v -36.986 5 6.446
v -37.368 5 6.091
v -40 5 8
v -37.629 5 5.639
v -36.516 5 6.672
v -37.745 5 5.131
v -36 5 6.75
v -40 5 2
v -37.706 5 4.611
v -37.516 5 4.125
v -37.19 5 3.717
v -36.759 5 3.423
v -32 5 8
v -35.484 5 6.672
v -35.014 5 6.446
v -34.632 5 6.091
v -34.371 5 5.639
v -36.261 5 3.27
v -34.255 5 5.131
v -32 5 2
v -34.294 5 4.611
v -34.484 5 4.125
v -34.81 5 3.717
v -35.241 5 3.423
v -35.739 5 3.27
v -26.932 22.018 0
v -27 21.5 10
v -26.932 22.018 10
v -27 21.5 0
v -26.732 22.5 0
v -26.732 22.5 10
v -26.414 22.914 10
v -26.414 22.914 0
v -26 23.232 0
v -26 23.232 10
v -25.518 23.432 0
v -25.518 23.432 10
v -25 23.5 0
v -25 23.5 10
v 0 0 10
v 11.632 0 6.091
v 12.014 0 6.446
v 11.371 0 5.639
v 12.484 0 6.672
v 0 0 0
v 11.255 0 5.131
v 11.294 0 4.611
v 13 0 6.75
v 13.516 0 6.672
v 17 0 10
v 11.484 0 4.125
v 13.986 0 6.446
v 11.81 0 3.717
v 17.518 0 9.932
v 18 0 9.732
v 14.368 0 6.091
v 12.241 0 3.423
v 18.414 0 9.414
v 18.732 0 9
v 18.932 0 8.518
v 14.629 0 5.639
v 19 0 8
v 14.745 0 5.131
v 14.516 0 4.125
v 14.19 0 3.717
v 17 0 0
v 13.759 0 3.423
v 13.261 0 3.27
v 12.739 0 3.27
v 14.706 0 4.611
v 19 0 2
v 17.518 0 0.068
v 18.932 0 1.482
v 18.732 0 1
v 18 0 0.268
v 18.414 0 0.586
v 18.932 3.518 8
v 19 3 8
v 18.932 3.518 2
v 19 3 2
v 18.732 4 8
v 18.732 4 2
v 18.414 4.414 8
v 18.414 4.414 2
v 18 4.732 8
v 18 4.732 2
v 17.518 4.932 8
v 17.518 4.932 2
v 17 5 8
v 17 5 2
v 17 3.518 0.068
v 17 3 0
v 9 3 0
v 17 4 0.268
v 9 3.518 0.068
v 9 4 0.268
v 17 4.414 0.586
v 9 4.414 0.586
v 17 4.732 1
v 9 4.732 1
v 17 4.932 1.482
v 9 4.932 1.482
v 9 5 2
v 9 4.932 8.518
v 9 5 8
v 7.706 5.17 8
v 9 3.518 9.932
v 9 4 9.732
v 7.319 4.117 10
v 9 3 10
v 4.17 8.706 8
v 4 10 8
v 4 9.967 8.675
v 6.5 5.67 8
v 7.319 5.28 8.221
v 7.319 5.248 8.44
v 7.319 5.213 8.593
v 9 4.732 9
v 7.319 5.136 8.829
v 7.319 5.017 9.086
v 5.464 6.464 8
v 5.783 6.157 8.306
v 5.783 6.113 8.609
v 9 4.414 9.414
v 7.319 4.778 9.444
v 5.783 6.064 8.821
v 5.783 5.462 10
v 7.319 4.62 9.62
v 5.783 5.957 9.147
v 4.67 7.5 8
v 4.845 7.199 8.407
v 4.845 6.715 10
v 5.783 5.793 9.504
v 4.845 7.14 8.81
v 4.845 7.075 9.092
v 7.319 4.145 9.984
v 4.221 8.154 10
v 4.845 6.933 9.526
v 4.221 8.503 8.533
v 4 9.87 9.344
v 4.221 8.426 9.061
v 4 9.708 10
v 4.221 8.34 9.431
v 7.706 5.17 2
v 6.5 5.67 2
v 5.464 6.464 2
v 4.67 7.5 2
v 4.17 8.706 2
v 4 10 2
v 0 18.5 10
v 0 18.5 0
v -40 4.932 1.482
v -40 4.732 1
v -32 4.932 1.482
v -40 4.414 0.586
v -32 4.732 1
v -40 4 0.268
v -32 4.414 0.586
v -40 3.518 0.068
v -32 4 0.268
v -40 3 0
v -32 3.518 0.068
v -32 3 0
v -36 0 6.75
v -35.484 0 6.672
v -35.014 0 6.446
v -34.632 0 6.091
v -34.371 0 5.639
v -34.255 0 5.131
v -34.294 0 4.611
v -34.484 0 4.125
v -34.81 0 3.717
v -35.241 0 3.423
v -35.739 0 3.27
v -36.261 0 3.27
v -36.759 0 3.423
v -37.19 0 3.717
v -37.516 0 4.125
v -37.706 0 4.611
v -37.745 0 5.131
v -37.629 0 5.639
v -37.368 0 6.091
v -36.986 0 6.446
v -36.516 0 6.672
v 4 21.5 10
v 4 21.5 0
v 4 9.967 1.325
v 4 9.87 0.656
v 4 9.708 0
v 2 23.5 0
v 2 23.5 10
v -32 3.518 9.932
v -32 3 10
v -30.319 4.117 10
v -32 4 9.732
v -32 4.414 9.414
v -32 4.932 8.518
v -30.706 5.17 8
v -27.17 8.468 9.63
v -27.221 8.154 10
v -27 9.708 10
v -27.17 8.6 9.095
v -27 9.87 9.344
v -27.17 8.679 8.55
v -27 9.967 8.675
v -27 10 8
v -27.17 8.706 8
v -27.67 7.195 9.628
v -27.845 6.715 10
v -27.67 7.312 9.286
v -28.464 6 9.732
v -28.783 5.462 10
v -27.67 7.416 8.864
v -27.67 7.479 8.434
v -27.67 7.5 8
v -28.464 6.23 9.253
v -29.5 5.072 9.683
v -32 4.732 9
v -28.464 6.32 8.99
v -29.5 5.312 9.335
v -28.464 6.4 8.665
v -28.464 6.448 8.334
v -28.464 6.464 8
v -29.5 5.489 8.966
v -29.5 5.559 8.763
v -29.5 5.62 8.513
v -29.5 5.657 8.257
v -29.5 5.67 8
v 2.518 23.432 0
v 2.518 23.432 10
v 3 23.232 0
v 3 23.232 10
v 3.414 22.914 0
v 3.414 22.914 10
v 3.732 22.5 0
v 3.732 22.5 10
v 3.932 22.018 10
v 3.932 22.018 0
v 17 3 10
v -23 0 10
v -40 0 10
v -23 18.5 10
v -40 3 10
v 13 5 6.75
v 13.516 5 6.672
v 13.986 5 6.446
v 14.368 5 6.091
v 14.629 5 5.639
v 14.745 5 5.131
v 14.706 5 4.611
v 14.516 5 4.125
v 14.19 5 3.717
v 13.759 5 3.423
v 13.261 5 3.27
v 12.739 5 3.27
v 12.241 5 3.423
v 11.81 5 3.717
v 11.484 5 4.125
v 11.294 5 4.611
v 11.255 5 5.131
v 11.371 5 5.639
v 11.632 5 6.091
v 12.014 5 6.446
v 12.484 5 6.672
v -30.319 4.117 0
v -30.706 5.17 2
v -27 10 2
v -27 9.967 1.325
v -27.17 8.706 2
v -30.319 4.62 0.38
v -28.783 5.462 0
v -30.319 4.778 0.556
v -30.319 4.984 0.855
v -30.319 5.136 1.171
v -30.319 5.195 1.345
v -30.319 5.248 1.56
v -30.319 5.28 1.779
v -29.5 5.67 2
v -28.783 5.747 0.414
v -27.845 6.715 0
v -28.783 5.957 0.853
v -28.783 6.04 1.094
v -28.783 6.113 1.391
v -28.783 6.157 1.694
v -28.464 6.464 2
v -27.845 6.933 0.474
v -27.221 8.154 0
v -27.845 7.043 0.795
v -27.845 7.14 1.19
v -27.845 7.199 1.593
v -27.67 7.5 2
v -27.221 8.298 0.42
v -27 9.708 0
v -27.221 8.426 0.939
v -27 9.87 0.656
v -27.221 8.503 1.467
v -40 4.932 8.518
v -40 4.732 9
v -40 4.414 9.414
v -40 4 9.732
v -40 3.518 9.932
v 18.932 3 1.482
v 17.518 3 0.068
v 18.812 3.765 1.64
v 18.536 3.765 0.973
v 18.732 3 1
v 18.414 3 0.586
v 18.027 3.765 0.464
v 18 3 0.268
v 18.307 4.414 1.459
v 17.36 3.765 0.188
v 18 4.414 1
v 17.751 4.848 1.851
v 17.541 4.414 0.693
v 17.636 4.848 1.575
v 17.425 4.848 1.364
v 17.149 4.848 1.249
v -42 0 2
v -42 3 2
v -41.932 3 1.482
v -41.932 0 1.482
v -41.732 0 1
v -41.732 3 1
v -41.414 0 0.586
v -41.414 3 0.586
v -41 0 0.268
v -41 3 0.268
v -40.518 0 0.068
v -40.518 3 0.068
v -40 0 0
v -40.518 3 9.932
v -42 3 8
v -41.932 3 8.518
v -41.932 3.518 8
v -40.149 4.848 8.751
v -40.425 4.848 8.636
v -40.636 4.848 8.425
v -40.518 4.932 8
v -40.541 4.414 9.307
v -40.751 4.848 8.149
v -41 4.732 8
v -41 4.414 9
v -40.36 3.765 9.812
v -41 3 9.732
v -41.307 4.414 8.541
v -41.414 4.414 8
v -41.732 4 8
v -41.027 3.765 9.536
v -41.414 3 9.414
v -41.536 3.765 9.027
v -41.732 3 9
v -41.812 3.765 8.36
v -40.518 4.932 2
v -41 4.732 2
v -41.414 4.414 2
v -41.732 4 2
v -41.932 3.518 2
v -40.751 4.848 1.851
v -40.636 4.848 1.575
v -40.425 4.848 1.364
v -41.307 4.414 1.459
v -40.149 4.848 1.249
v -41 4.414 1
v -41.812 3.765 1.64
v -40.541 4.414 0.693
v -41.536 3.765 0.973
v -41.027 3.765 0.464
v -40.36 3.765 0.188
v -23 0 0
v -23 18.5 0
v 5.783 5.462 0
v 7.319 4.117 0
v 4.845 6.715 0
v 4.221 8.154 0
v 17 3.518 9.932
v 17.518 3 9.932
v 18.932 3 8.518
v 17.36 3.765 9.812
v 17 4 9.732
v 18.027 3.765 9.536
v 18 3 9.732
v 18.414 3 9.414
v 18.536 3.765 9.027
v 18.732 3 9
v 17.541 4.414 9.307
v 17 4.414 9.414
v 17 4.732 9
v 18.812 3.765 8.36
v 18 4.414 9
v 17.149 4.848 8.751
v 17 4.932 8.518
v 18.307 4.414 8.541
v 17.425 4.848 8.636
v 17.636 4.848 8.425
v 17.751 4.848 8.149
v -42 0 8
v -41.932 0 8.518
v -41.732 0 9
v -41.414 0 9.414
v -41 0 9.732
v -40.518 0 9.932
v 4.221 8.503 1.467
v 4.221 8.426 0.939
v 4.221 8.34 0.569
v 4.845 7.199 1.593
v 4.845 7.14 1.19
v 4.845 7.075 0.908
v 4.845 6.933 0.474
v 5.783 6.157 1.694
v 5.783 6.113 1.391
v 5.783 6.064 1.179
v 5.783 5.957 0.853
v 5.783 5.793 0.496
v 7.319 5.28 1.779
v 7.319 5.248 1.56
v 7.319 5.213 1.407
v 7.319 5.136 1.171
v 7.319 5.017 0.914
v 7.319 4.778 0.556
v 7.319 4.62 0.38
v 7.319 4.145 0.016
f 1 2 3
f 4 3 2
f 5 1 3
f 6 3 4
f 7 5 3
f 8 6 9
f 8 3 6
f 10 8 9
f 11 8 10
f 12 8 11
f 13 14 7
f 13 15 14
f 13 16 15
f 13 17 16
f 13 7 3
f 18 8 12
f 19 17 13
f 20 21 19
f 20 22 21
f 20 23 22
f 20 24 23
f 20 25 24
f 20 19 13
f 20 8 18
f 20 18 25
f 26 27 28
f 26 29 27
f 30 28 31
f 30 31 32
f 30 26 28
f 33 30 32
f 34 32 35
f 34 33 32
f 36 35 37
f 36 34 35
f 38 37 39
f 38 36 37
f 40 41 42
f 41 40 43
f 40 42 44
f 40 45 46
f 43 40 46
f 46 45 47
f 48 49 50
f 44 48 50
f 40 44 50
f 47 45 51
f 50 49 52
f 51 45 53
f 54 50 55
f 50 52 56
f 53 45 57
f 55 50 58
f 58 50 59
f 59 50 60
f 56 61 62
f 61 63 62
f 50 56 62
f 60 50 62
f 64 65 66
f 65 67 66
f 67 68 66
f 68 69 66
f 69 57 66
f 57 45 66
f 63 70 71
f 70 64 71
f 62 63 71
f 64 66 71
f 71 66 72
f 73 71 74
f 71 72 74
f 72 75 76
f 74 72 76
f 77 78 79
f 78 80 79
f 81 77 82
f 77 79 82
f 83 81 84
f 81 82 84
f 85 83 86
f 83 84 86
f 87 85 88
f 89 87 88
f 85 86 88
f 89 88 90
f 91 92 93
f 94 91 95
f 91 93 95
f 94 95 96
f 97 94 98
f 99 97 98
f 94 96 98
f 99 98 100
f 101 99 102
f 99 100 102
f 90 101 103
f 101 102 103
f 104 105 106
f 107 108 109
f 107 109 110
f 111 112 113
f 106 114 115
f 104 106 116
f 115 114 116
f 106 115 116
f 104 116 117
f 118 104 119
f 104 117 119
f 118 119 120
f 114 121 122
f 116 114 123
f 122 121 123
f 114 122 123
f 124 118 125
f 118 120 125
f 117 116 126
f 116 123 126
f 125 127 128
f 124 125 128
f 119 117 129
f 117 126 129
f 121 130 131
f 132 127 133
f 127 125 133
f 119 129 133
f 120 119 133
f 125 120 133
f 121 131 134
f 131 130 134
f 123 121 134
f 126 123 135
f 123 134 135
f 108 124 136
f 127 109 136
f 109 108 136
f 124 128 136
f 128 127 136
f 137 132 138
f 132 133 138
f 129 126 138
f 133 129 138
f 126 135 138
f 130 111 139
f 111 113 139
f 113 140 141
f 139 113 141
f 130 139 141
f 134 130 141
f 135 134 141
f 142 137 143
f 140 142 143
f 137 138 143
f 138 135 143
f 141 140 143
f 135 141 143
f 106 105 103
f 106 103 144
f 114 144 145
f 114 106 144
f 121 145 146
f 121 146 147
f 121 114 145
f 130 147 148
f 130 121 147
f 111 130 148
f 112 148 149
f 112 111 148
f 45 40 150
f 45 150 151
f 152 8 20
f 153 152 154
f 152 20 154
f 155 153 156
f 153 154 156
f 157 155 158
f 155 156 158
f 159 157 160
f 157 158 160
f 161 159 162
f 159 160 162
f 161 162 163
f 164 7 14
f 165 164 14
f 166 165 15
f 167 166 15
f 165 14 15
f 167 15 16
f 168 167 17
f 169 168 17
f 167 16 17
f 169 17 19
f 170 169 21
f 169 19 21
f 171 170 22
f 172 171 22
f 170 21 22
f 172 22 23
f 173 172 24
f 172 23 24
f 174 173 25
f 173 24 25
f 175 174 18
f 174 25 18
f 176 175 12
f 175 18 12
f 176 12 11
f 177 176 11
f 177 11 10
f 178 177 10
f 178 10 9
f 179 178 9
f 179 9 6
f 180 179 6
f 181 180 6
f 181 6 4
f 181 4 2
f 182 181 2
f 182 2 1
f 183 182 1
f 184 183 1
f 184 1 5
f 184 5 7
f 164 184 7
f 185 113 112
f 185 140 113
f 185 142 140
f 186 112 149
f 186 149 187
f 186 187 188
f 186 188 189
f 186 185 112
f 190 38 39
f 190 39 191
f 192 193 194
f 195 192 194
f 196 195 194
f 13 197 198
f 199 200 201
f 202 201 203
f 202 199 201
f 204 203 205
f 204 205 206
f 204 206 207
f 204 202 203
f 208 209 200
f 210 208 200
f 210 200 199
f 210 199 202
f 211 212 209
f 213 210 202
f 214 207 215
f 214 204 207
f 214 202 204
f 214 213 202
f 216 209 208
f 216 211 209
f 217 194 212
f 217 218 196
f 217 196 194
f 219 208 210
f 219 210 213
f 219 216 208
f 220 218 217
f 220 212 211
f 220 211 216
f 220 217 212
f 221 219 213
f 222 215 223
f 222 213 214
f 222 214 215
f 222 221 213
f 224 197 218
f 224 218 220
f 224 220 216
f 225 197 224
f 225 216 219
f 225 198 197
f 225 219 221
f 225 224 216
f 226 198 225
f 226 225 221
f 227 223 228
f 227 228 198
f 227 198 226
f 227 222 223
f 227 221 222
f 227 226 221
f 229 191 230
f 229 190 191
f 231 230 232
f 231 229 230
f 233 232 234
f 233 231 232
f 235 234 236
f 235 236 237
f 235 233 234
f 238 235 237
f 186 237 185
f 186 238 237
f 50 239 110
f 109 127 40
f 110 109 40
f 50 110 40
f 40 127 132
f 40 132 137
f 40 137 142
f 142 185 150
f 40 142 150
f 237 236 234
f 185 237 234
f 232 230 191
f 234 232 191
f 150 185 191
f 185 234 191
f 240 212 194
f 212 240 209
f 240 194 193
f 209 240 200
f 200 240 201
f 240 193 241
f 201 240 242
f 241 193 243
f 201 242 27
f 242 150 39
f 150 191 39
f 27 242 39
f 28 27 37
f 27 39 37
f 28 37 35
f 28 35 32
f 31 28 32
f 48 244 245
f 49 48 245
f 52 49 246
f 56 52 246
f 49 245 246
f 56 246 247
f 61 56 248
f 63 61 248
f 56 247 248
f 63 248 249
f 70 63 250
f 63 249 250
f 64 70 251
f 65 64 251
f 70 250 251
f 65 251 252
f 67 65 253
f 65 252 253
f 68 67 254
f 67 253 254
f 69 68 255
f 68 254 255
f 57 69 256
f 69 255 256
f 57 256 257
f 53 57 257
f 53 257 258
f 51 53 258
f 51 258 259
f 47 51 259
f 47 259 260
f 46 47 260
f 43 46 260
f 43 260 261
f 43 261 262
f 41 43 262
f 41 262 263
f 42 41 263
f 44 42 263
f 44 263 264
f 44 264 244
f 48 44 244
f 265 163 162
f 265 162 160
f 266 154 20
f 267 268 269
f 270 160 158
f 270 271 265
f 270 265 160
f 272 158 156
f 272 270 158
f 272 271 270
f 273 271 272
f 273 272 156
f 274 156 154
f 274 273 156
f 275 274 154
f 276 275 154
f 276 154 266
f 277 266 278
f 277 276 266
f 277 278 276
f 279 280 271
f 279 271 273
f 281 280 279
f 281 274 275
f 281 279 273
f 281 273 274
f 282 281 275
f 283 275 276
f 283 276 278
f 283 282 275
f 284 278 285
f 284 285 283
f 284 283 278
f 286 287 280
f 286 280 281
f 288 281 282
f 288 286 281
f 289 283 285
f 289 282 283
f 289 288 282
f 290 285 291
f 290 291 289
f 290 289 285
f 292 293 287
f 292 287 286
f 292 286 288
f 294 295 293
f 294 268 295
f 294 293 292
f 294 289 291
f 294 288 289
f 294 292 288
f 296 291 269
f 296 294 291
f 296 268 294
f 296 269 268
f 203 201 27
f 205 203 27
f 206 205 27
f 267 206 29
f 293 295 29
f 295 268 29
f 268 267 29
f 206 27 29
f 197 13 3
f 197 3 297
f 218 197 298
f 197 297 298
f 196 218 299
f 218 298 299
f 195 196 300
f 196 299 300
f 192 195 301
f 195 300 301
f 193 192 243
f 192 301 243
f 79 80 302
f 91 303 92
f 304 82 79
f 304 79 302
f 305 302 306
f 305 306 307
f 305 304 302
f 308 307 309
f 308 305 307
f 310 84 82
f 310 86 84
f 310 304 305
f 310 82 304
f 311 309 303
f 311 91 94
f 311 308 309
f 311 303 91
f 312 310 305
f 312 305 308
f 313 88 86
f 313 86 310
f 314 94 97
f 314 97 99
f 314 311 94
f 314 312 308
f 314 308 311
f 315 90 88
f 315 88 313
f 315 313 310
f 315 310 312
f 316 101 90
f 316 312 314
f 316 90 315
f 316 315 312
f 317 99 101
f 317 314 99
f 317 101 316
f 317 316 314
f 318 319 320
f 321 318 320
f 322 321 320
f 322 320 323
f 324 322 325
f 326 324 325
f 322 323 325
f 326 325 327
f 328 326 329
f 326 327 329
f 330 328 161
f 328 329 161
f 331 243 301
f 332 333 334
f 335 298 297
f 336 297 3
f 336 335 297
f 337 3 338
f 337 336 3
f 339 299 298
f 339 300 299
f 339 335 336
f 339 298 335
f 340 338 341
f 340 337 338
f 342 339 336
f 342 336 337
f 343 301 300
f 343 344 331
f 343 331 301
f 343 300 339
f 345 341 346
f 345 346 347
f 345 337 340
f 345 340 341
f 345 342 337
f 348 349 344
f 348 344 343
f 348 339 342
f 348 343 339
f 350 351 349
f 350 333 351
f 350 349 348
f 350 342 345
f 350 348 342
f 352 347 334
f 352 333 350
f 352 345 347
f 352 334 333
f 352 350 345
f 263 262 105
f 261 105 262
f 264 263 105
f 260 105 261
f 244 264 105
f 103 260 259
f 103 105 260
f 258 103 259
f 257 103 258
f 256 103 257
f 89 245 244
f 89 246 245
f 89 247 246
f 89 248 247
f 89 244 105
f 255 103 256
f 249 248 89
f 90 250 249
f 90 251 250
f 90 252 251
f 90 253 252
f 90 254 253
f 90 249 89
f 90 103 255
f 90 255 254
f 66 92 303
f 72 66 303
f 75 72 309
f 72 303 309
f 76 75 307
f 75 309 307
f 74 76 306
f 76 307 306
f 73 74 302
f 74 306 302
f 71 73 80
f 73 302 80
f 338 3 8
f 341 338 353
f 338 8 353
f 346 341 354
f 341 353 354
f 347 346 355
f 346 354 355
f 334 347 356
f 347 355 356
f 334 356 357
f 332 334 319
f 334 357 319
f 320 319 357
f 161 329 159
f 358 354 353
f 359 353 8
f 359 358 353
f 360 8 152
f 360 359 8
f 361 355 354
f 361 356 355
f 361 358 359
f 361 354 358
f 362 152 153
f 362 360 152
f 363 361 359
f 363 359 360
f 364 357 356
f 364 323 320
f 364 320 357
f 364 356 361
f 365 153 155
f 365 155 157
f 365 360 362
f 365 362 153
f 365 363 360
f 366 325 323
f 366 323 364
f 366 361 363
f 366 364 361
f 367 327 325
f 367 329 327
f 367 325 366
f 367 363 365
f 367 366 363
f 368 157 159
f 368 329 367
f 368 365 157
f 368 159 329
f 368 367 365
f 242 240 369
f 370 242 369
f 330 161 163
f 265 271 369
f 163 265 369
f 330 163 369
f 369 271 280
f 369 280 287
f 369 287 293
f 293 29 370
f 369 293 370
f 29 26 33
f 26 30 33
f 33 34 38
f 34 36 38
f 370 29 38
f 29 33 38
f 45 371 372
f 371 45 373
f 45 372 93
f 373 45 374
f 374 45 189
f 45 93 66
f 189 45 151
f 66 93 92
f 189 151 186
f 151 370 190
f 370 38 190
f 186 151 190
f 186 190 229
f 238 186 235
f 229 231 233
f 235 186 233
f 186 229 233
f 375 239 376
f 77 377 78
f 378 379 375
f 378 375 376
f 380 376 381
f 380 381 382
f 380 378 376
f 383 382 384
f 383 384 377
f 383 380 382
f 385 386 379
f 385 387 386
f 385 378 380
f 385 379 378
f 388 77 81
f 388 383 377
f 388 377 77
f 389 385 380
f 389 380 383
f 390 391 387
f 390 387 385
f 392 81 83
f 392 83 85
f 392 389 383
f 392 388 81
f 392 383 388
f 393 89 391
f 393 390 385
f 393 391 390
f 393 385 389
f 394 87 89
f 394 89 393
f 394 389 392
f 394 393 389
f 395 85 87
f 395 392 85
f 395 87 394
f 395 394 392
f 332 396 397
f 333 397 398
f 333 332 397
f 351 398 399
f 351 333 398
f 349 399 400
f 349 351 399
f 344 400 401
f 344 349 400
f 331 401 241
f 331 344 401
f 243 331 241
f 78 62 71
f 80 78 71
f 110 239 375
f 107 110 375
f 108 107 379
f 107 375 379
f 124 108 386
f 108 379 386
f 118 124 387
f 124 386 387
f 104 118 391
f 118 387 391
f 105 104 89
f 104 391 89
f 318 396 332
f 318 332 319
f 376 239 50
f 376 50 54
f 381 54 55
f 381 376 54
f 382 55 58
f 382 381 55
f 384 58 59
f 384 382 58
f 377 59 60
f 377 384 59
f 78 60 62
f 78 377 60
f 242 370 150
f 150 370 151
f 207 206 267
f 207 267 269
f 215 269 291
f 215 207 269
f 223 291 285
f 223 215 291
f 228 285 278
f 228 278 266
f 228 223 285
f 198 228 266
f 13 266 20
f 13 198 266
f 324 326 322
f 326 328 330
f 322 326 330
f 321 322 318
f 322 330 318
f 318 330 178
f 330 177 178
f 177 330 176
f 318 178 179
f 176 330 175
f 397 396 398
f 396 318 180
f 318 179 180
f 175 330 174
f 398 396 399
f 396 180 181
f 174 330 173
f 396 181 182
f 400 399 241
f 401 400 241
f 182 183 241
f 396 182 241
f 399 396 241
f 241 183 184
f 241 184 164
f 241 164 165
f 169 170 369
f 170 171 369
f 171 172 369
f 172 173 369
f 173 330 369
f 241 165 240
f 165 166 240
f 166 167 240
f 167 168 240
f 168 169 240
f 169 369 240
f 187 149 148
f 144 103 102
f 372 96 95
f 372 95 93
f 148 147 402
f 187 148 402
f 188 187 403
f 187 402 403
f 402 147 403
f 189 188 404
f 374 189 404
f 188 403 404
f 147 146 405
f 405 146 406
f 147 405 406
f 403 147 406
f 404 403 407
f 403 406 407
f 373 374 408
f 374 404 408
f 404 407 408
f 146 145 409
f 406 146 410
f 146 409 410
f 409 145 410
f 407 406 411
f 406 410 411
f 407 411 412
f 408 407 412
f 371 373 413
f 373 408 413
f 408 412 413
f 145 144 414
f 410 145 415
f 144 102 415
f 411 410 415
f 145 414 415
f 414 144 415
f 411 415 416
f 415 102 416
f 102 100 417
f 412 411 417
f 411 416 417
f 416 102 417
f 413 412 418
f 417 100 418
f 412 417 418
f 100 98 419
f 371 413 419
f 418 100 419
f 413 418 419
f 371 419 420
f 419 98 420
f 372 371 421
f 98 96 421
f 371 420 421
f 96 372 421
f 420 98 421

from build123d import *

# Parameters (mm, degrees)
SKETCH1_W           = 15
SKETCH1_H           = 10
SKETCH1_W_2         = 4
SKETCH1_W_3         = 23
BOSS_EXTRUDE1_DEPTH = 23.5
SKETCH1_3_W         = 23
SKETCH1_3_H         = 10
CUT_EXTRUDE1_DEPTH  = 18.5
CUT_EXTRUDE2_START  = 23.5
SKETCH1_4_W         = 15
SKETCH1_4_H         = 10
CUT_EXTRUDE2_DEPTH  = 18.5
FILLET1_R           = 2
FILLET2_R           = 2
FILLET3_R           = 5
CUT_EXTRUDE3_REACH  = 48.971
SKETCH2_R           = 1.75


with BuildPart() as part:
    # Sketch1 → Boss-Extrude1 (new body)
    with BuildSketch(Plane(origin=(0, 0, 0), x_dir=(1, 0, 0), z_dir=(0, 1, 0))):
        with Locations((-34.5, -5)):
            Rectangle(SKETCH1_W, SKETCH1_H)
        with Locations((-25, -5)):
            Rectangle(SKETCH1_W_2, SKETCH1_H)
        with Locations((-11.5, -5)):
            Rectangle(SKETCH1_W_3, SKETCH1_H)
        with Locations((2, -5)):
            Rectangle(SKETCH1_W_2, SKETCH1_H)
        with Locations((11.5, -5)):
            Rectangle(SKETCH1_W, SKETCH1_H)
    extrude(amount=BOSS_EXTRUDE1_DEPTH)

    # Sketch1<3> → Cut-Extrude1 (cut)
    with BuildSketch(Plane(origin=(0, 0, 0), x_dir=(1, 0, 0), z_dir=(0, 1, 0))):
        with Locations((-11.5, -5)):
            Rectangle(SKETCH1_3_W, SKETCH1_3_H)
    extrude(amount=CUT_EXTRUDE1_DEPTH, mode=Mode.SUBTRACT)

    # Sketch1<4> → Cut-Extrude2 (cut)
    with BuildSketch(Plane(origin=(0, 0, 0), x_dir=(1, 0, 0), z_dir=(0, 1, 0)).offset(CUT_EXTRUDE2_START)):
        with Locations((-34.5, -5)):
            Rectangle(SKETCH1_4_W, SKETCH1_4_H)
        with Locations((11.5, -5)):
            Rectangle(SKETCH1_4_W, SKETCH1_4_H)
    extrude(amount=-CUT_EXTRUDE2_DEPTH, mode=Mode.SUBTRACT)

    # Fillet1
    fillet1_edges = [part.edges().sort_by_distance(p)[0] for p in [
        (19, 2.5, 0),
        (19, 2.5, 10),
        (-42, 2.5, 10),
        (-42, 2.5, 0),
        (-27, 23.5, 5),
        (4, 23.5, 5),
    ]]
    fillet(fillet1_edges, radius=FILLET1_R)

    # Fillet2
    fillet2_edges = [part.edges().sort_by_distance(p)[0] for p in [
        (-33.5, 5, 0),
        (-33.5, 5, 10),
        (10.5, 5, 10),
        (10.5, 5, 0),
        (19, 5, 5),
        (18.414213562, 5, 9.414213562),
        (18.414213562, 5, 0.585786438),
        (-42, 5, 5),
        (-41.414213562, 5, 9.414213562),
        (-41.414213562, 5, 0.585786438),
    ]]
    fillet(fillet2_edges, radius=FILLET2_R)

    # Fillet3
    # the kernel refuses this fillet: 5 mm, written as the material it adds along each edge
    with BuildSketch(Plane(origin=(-27, 5, 8), x_dir=(-1, 0, 0), z_dir=(0, 0, -1))) as fillet3_piece_1:
        with BuildLine():
            CenterArc((FILLET3_R, FILLET3_R), FILLET3_R, 180, 90)
            Line((0, FILLET3_R), (0, 0))
            Line((0, 0), (FILLET3_R, 0))
        make_face()
    extrude(amount=6)
    with BuildSketch(Plane(origin=(4, 5, 8), x_dir=(1, 0, 0), z_dir=(0, 0, -1))) as fillet3_piece_2:
        with BuildLine():
            CenterArc((FILLET3_R, -FILLET3_R), FILLET3_R, 90, 90)
            Line((0, -FILLET3_R), (0, 0))
            Line((0, 0), (FILLET3_R, 0))
        make_face()
    extrude(amount=6)
    with BuildSketch(Plane(origin=(-27, 3, 8), x_dir=(0, 0.9999802608561372, -0.006283143965558846), z_dir=(0, 0.006283143965558846, 0.9999802608561372))) as fillet3_piece_3_section:
        with BuildLine():
            CenterArc((-2 - FILLET3_R, FILLET3_R), FILLET3_R, 270, 90)
            Line((-2 - FILLET3_R, 0), (-2, 0))
            Line((-2, 0), (-2, FILLET3_R))
        make_face()
    fillet3_piece_3 = revolve(axis=Axis((-27, 3, 8), (-1, 0, 0)), revolution_arc=359.64, mode=Mode.PRIVATE)
    fillet3_piece_3 = split(fillet3_piece_3, bisect_by=Plane(origin=(-28.84257052, 4.524977571, 10), z_dir=(0, 0, -1)), keep=Keep.TOP, mode=Mode.PRIVATE)
    fillet3_piece_3 = split(fillet3_piece_3, bisect_by=Plane(origin=(-28.84257052, 0, 9.524977571), z_dir=(0, 1, 0)), keep=Keep.TOP, mode=Mode.PRIVATE)
    add(fillet3_piece_3)
    with BuildSketch(Plane(origin=(4, 3, 8), x_dir=(0, 1, 0), z_dir=(0, 0, -1))) as fillet3_piece_4_section:
        with BuildLine():
            CenterArc((2 + FILLET3_R, FILLET3_R), FILLET3_R, 180, 90)
            Line((2 + FILLET3_R, 0), (2, 0))
            Line((2, 0), (2, FILLET3_R))
        make_face()
    fillet3_piece_4 = revolve(axis=Axis((4, 3, 8), (1, 0, 0)), revolution_arc=359.64, mode=Mode.PRIVATE)
    fillet3_piece_4 = split(fillet3_piece_4, bisect_by=Plane(origin=(5.842570594, 4.524977559, 10), z_dir=(0, 0, -1)), keep=Keep.TOP, mode=Mode.PRIVATE)
    fillet3_piece_4 = split(fillet3_piece_4, bisect_by=Plane(origin=(5.842570594, 0, 9.524977563), z_dir=(0, 1, 0)), keep=Keep.TOP, mode=Mode.PRIVATE)
    add(fillet3_piece_4)
    with BuildSketch(Plane(origin=(-27, 3, 2), x_dir=(0, 0.9999802608561372, 0.006283143965559623), z_dir=(0, 0.006283143965559623, -0.9999802608561372))) as fillet3_piece_5_section:
        with BuildLine():
            CenterArc((-2 - FILLET3_R, -FILLET3_R), FILLET3_R, 0, 90)
            Line((-2 - FILLET3_R, 0), (-2, 0))
            Line((-2, 0), (-2, -FILLET3_R))
        make_face()
    fillet3_piece_5 = revolve(axis=Axis((-27, 3, 2), (1, 0, 0)), revolution_arc=359.64, mode=Mode.PRIVATE)
    fillet3_piece_5 = split(fillet3_piece_5, bisect_by=Plane(origin=(-28.842570484, 4.524977653, 0), z_dir=(0, 0, 1)), keep=Keep.TOP, mode=Mode.PRIVATE)
    fillet3_piece_5 = split(fillet3_piece_5, bisect_by=Plane(origin=(-28.842570484, 0, 0.47502245), z_dir=(0, 1, 0)), keep=Keep.TOP, mode=Mode.PRIVATE)
    add(fillet3_piece_5)
    with BuildSketch(Plane(origin=(4, 3, 2), x_dir=(0, 1, 0), z_dir=(0, 0, 1))) as fillet3_piece_6_section:
        with BuildLine():
            CenterArc((2 + FILLET3_R, -FILLET3_R), FILLET3_R, 90, 90)
            Line((2, -FILLET3_R), (2, 0))
            Line((2, 0), (2 + FILLET3_R, 0))
        make_face()
    fillet3_piece_6 = revolve(axis=Axis((4, 3, 2), (-1, 0, 0)), revolution_arc=359.64, mode=Mode.PRIVATE)
    fillet3_piece_6 = split(fillet3_piece_6, bisect_by=Plane(origin=(4.944030812, 6.137069115, 0), z_dir=(0, 0, 1)), keep=Keep.TOP, mode=Mode.PRIVATE)
    fillet3_piece_6 = split(fillet3_piece_6, bisect_by=Plane(origin=(4.944030812, 0, 1.077199574), z_dir=(0, 1, 0)), keep=Keep.TOP, mode=Mode.PRIVATE)
    add(fillet3_piece_6)

    # Sketch2 → Cut-Extrude3 (cut, up to next)
    with BuildSketch(Plane(origin=(0, 5, 0), x_dir=(1, 0, 0), z_dir=(0, 1, 0)), mode=Mode.PRIVATE) as cut_extrude3_sk1:
        with Locations(Location((13, -5, 0), (0, 0, 270))):
            Circle(SKETCH2_R)
    cut_extrude3_tool1 = extrude(cut_extrude3_sk1.sketch, amount=-CUT_EXTRUDE3_REACH, mode=Mode.PRIVATE) & part.part
    # Sketch2 → Cut-Extrude3 (cut, up to next)
    with BuildSketch(Plane(origin=(0, 5, 0), x_dir=(1, 0, 0), z_dir=(0, 1, 0)), mode=Mode.PRIVATE) as cut_extrude3_sk2:
        with Locations(Location((-36, -5, 0), (0, 0, 270))):
            Circle(SKETCH2_R)
    cut_extrude3_tool2 = extrude(cut_extrude3_sk2.sketch, amount=-CUT_EXTRUDE3_REACH, mode=Mode.PRIVATE) & part.part
    add(cut_extrude3_tool1.solids().sort_by_distance((13, 5, 5))[0], mode=Mode.SUBTRACT)
    add(cut_extrude3_tool2.solids().sort_by_distance((-36, 5, 5))[0], mode=Mode.SUBTRACT)


solid = part.part
